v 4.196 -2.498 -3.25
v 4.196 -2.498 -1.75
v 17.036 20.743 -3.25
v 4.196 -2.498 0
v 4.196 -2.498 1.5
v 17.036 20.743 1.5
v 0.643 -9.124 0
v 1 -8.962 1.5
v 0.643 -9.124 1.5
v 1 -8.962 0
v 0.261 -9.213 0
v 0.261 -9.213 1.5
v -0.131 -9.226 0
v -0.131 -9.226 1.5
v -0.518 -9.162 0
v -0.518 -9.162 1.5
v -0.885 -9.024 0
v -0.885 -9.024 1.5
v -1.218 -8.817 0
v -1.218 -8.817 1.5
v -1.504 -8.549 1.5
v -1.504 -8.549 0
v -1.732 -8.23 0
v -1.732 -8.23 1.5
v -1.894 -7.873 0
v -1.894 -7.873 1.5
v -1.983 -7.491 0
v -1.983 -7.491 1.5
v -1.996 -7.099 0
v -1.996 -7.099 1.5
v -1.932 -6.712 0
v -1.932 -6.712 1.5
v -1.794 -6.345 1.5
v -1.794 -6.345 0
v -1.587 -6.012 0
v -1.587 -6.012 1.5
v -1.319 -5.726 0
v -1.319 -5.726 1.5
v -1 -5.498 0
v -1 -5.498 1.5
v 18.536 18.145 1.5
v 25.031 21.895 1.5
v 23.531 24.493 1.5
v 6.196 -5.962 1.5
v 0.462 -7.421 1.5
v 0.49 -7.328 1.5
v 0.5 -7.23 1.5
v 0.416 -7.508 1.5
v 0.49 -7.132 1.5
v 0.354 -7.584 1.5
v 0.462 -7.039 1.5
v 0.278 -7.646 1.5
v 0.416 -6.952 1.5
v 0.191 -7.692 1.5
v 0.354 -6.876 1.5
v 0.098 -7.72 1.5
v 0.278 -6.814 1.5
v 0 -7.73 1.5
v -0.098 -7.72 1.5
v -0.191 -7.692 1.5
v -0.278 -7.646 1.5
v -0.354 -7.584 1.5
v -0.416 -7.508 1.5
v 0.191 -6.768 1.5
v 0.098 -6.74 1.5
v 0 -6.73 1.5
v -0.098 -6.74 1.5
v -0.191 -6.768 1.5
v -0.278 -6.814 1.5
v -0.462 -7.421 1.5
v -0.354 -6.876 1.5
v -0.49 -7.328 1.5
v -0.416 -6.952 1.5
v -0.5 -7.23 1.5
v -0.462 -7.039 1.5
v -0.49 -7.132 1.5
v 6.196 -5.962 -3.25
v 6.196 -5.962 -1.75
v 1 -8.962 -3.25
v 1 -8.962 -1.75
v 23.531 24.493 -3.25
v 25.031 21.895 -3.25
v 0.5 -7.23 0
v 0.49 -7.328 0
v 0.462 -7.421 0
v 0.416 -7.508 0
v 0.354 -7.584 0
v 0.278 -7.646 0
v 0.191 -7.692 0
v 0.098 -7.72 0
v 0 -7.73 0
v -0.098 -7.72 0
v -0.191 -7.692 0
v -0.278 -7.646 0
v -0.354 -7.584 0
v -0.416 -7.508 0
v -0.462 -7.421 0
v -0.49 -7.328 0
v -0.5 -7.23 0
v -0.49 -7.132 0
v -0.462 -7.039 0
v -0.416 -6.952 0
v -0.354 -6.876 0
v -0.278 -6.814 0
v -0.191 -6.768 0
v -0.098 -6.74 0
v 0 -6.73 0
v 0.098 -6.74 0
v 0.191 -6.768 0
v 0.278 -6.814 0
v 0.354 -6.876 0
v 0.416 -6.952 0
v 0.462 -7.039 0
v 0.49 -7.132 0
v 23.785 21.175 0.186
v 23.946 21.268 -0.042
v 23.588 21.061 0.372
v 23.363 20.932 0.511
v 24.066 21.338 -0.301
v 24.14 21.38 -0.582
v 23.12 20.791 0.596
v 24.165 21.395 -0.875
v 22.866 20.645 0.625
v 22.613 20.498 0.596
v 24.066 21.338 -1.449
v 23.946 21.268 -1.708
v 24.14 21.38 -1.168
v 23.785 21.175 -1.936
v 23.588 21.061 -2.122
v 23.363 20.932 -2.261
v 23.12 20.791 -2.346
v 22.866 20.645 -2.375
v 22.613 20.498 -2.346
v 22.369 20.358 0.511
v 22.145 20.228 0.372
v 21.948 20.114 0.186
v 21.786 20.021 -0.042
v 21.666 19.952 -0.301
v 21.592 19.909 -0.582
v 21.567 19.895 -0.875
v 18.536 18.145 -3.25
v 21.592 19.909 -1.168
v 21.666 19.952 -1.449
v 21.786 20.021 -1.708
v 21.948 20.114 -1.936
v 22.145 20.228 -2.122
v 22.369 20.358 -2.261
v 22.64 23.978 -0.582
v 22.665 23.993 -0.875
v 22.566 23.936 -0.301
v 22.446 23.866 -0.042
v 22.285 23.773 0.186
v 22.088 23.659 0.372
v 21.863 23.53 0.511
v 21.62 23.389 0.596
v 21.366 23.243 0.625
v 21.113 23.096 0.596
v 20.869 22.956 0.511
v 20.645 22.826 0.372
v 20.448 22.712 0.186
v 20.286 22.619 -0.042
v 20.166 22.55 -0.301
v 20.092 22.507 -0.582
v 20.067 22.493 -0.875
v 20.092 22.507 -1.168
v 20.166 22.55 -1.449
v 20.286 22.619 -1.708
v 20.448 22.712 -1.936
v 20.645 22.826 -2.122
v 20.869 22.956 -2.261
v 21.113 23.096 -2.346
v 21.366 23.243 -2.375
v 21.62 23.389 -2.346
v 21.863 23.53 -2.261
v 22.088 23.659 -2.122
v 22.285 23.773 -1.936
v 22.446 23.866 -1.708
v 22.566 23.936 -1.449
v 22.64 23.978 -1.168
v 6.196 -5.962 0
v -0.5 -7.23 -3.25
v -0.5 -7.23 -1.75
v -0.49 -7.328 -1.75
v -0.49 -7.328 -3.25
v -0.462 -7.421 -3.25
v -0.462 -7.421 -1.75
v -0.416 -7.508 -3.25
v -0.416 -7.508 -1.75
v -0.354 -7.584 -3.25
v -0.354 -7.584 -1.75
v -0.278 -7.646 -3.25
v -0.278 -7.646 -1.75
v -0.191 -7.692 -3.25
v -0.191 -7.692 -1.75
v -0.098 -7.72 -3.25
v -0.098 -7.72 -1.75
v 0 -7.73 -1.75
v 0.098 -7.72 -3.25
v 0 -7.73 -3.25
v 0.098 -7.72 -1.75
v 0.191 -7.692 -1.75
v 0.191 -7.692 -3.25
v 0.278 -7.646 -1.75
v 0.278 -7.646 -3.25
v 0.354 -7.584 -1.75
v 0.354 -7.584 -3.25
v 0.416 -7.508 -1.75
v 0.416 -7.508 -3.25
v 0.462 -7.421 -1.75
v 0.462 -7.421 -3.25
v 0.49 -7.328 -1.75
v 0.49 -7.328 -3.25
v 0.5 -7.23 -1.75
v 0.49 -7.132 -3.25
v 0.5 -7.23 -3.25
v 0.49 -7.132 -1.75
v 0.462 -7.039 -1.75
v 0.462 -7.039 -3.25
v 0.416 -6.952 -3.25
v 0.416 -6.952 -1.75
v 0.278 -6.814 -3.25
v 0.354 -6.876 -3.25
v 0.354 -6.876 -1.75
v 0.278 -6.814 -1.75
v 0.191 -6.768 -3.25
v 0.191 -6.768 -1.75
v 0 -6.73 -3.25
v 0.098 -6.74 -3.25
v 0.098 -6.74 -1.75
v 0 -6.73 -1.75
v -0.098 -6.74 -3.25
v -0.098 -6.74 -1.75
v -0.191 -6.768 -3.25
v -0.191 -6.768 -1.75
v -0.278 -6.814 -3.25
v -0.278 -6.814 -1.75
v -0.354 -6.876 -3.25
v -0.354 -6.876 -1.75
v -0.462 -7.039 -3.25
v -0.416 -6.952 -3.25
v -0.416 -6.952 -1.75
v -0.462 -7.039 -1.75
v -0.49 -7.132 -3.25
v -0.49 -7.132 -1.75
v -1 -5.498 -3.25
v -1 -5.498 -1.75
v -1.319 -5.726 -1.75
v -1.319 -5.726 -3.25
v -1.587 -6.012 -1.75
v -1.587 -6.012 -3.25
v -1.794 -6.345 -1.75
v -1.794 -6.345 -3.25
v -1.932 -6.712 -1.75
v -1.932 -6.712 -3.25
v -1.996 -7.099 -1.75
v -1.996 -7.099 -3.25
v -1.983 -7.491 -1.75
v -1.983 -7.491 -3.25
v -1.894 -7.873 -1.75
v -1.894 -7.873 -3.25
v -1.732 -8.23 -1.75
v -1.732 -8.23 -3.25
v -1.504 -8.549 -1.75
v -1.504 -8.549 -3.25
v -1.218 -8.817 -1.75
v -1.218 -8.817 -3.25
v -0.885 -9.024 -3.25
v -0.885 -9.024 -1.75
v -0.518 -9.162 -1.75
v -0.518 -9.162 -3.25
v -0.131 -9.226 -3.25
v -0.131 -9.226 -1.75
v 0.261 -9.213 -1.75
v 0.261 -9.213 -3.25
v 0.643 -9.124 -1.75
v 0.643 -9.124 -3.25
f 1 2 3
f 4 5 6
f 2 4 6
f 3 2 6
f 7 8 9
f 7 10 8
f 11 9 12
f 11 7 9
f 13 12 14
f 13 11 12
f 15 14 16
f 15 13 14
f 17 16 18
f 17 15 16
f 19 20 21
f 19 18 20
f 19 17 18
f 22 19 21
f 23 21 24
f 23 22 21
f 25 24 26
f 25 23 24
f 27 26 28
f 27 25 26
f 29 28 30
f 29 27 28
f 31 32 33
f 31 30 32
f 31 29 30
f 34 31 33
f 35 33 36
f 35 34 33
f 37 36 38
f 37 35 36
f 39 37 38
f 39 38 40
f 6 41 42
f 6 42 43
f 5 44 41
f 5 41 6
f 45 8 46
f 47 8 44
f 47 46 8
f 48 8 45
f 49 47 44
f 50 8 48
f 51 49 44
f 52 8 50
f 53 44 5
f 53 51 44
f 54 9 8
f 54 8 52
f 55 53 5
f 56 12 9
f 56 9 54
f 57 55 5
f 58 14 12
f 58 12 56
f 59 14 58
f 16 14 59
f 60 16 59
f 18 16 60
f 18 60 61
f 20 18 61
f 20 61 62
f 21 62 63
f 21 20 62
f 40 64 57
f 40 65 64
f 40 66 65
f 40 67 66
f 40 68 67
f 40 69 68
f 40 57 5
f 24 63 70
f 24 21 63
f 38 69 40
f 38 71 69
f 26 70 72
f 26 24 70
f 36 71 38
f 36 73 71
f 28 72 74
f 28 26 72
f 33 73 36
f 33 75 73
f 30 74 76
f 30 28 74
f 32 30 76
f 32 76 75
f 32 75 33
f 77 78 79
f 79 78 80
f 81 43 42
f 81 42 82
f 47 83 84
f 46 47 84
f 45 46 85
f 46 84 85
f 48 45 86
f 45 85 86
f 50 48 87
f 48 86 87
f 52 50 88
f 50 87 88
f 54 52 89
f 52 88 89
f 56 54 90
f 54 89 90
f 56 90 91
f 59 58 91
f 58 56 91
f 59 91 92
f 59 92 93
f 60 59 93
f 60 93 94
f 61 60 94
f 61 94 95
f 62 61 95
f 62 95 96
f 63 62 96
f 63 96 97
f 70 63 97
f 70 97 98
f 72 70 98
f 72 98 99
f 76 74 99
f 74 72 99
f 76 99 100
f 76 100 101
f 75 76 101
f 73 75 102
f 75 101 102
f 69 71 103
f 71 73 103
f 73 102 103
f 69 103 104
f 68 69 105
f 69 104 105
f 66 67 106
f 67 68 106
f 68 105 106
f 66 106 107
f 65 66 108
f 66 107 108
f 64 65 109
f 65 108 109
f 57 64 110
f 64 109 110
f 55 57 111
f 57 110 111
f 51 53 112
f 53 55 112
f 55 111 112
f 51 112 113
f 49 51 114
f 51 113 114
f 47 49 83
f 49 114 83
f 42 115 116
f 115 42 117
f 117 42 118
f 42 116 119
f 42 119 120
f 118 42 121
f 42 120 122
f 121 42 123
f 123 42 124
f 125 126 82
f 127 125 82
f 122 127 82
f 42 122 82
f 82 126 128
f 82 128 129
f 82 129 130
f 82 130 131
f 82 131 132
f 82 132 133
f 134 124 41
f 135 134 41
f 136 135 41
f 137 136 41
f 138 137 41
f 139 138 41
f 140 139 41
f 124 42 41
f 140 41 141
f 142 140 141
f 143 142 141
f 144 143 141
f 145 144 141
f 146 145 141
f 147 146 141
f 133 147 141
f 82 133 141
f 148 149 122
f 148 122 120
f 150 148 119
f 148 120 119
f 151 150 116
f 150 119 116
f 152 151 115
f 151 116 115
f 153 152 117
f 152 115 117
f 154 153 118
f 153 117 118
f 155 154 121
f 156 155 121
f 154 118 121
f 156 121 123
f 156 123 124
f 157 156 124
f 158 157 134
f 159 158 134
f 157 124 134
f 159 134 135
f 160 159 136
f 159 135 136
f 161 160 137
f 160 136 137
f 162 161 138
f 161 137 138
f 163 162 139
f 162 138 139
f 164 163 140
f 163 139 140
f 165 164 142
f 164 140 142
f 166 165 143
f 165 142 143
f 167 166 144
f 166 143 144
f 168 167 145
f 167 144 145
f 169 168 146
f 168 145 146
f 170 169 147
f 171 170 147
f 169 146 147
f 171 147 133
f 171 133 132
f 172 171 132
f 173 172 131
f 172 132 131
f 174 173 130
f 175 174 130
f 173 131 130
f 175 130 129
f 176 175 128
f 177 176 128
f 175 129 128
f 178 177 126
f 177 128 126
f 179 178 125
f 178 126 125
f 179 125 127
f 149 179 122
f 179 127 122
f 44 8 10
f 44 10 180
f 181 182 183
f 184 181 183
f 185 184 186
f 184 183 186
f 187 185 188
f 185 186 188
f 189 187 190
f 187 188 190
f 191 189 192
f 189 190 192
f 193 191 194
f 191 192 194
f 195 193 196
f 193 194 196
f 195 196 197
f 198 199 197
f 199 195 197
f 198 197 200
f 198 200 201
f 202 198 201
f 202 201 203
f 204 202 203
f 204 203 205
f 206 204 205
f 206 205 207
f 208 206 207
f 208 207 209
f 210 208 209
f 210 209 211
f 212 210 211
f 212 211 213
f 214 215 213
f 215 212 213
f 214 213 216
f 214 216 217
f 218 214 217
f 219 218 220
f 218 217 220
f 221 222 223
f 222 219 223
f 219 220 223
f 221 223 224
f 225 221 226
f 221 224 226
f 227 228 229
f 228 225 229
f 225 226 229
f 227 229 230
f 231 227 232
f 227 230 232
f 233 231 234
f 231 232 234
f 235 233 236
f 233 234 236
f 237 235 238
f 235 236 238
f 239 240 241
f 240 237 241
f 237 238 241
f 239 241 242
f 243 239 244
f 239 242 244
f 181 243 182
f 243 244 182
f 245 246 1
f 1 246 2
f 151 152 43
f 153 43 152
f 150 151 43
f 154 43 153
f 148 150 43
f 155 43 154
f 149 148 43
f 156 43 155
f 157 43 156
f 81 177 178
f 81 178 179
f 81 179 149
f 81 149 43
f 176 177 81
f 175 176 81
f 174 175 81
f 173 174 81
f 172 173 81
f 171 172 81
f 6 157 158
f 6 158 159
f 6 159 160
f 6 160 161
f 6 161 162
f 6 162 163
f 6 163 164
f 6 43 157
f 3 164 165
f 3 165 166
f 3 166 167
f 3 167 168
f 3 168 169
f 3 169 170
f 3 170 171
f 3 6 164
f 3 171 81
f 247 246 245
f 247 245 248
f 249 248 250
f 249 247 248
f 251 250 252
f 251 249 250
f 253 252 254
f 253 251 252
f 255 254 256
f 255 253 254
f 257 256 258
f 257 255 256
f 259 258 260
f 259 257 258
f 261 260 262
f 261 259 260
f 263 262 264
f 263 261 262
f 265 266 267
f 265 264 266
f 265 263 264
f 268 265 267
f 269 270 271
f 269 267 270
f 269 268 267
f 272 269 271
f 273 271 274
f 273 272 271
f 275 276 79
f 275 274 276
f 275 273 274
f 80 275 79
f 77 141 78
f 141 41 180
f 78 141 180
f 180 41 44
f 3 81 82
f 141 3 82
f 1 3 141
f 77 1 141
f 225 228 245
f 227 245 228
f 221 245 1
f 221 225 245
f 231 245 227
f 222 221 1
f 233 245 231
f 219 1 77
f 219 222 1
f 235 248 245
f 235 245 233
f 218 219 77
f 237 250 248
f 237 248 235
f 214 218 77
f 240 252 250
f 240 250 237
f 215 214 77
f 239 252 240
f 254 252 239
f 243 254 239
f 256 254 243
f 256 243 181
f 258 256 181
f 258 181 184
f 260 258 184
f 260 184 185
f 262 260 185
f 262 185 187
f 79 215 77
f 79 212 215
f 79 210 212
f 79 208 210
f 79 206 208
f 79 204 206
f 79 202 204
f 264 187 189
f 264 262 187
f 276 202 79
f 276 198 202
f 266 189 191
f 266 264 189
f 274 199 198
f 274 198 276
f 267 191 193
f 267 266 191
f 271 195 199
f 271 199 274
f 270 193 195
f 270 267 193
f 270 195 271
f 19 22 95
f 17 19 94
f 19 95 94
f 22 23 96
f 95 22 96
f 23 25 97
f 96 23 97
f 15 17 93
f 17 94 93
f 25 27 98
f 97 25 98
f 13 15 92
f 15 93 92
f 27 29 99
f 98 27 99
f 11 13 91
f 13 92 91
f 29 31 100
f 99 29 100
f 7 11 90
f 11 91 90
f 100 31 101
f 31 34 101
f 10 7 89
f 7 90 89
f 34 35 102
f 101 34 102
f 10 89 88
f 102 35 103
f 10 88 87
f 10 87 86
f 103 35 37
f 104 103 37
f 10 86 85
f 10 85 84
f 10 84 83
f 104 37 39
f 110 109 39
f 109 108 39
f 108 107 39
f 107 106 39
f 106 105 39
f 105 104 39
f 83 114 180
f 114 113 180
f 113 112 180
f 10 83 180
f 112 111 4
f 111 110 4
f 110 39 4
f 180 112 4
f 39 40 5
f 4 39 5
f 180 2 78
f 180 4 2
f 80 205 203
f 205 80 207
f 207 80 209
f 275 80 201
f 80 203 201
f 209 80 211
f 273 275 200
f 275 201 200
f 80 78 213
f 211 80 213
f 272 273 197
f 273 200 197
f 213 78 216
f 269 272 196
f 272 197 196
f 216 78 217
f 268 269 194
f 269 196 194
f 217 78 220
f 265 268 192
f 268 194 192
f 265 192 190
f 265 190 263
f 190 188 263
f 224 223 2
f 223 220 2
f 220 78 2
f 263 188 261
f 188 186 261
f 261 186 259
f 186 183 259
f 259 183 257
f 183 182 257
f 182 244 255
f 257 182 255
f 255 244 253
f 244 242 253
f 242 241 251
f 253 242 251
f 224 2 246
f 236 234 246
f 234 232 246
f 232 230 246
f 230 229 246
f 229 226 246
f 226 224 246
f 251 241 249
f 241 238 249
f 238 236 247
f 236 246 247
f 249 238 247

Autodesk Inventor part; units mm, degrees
ref_plane "YZ Plane" through (0, 0, 0) normal (1, 0, 0) x (0, 1, 0)
ref_plane "XZ Plane" through (0, 0, 0) normal (0, 1, 0) x (-1, 0, 0)
ref_plane "XY Plane" through (0, 0, 0) normal (0, 0, 1) x (1, 0, 0)
sketch "Sketch1" plane through (0, 0, 0) normal (0, 0, 1) x (1, 0, 0)
  circle A0 centre (0, -7.23) radius 0.5 projected
  circle A1 centre (0, -7.23) radius 2
  point P0 (0, 0)
  dimension "d0" = 4
extrude "Extrusion1" add sketch "Sketch1" along normal blind 1.5
sketch "Sketch2" plane through (0, -7.23, 1.5) normal (0, 0, 1) x (1, 0, 0)
  circle A0 centre (0, 0) radius 2 projected
  circle A1 centre (0, 0) radius 0.5 projected
  circle A2 centre (0, 0) radius 2 projected
  line L0 (1, -1.7321) -> (6.1962, 1.2679)
  line L1 (-1, 1.7321) -> (4.1962, 4.7321)
  line L2 (22.8311, 17.6353) -> (-6.9601, 0.4353) construction
  circle A3 centre (0, 0) radius 2 projected
  line L3 (4.1962, 4.7321) -> (17.0361, 27.9727)
  line L4 (6.1962, 1.2679) -> (18.5361, 25.3746)
  line L5 (4.1962, 4.7321) -> (6.1962, 1.2679) construction
  line L6 (18.5361, 25.3746) -> (17.0361, 27.9727)
  line L7 (15.8361, 30.0512) -> (18.5361, 25.3746) construction
  point P0 (0, 7.23)
  point P1 (-1, 1.7321)
  point P2 (1, -1.7321)
  dimension "d4" = 6
  dimension "d13" = 3
extrude "Extrusion2" add sketch "Sketch2" against normal blind 1.5 contours A0 L1 L3 L6 L4 L0
ref_plane "Work Plane1" through (0, 0, -1.75) normal (0, 0, -1) x (-1, 0, 0)
sketch "Sketch3" plane through (0, 0, -1.75) normal (0, 0, -1) x (-1, 0, 0)
  line L0 (1, -5.4979) -> (-4.1962, -2.4979) projected
  line L1 (-4.1962, -2.4979) -> (-17.0361, 20.7427) projected
  line L2 (-17.0361, 20.7427) -> (-18.5361, 18.1446) projected
  line L3 (-18.5361, 18.1446) -> (-6.1962, -5.9621) projected
  line L4 (-6.1962, -5.9621) -> (-1, -8.9621) projected
  arc A0 (-1, -8.9621) -> (1, -5.4979) centre (0, -7.23) ccw projected
  circle A1 centre (0, -7.23) radius 0.5 projected
  point P0 (0, 0)
extrude "Extrusion3" add sketch "Sketch3" along normal blind 1.5
sketch "Sketch4" plane through (0, 0, 0) normal (0, 0, -1) x (-1, 0, 0)
  line L0 (-17.0361, 20.7427) -> (-18.5361, 18.1446) projected
  line L1 (-18.5361, 18.1446) -> (-6.1962, -5.9621) projected
  line L2 (-6.1962, -5.9621) -> (-1, -8.9621) projected
  arc A0 (-1, -8.9621) -> (1, -5.4979) centre (0, -7.23) ccw projected
  line L3 (1, -5.4979) -> (-4.1962, -2.4979) projected
  line L4 (-4.1962, -2.4979) -> (-17.0361, 20.7427) projected
  circle A1 centre (0, -7.23) radius 0.5 projected
  line L5 (1, -5.4979) -> (-4.1962, -2.4979) projected
  line L6 (-4.1962, -2.4979) -> (-6.1962, -5.9621)
  point P0 (0, 0)
extrude "Extrusion4" add sketch "Sketch4" along normal up to next contours L4 L6 L1 L0
sketch "Sketch5" plane through (18.5361, 18.1446, 1.5) normal (0.866, 0.5, 0) x (0, 0, -1)
  line L0 (0, 0) -> (0, 3) projected
  line L1 (0, 0) -> (4.75, 0) projected
  line L2 (4.75, 3) -> (4.75, 0) projected
  line L3 (0, 3) -> (4.75, 3) projected
  point P0 (1.5, -6.4457)
extrude "Extrusion5" add sketch "Sketch5" along normal blind 7.5
sketch "Sketch6" plane through (18.5361, 18.1446, -3.25) normal (0.5, -0.866, 0) x (0.866, 0.5, 0)
  line L0 (0, 4.75) -> (0, 0) projected
  line L1 (0, 0) -> (7.5, 0) projected
  line L2 (7.5, 4.75) -> (7.5, 0) projected
  line L3 (0, 4.75) -> (7.5, 4.75) projected
  circle A0 centre (5, 2.375) radius 1.5
  point P0 (-25.125, 3.25)
  point P1 (0, 2.375)
  point P2 (3.75, 0)
  dimension "d14" = 3
  dimension "d17" = 2.5
extrude "Extrusion6" cut sketch "Sketch6" against normal up to next contours A0
properties part number "Union_dedo_base"
